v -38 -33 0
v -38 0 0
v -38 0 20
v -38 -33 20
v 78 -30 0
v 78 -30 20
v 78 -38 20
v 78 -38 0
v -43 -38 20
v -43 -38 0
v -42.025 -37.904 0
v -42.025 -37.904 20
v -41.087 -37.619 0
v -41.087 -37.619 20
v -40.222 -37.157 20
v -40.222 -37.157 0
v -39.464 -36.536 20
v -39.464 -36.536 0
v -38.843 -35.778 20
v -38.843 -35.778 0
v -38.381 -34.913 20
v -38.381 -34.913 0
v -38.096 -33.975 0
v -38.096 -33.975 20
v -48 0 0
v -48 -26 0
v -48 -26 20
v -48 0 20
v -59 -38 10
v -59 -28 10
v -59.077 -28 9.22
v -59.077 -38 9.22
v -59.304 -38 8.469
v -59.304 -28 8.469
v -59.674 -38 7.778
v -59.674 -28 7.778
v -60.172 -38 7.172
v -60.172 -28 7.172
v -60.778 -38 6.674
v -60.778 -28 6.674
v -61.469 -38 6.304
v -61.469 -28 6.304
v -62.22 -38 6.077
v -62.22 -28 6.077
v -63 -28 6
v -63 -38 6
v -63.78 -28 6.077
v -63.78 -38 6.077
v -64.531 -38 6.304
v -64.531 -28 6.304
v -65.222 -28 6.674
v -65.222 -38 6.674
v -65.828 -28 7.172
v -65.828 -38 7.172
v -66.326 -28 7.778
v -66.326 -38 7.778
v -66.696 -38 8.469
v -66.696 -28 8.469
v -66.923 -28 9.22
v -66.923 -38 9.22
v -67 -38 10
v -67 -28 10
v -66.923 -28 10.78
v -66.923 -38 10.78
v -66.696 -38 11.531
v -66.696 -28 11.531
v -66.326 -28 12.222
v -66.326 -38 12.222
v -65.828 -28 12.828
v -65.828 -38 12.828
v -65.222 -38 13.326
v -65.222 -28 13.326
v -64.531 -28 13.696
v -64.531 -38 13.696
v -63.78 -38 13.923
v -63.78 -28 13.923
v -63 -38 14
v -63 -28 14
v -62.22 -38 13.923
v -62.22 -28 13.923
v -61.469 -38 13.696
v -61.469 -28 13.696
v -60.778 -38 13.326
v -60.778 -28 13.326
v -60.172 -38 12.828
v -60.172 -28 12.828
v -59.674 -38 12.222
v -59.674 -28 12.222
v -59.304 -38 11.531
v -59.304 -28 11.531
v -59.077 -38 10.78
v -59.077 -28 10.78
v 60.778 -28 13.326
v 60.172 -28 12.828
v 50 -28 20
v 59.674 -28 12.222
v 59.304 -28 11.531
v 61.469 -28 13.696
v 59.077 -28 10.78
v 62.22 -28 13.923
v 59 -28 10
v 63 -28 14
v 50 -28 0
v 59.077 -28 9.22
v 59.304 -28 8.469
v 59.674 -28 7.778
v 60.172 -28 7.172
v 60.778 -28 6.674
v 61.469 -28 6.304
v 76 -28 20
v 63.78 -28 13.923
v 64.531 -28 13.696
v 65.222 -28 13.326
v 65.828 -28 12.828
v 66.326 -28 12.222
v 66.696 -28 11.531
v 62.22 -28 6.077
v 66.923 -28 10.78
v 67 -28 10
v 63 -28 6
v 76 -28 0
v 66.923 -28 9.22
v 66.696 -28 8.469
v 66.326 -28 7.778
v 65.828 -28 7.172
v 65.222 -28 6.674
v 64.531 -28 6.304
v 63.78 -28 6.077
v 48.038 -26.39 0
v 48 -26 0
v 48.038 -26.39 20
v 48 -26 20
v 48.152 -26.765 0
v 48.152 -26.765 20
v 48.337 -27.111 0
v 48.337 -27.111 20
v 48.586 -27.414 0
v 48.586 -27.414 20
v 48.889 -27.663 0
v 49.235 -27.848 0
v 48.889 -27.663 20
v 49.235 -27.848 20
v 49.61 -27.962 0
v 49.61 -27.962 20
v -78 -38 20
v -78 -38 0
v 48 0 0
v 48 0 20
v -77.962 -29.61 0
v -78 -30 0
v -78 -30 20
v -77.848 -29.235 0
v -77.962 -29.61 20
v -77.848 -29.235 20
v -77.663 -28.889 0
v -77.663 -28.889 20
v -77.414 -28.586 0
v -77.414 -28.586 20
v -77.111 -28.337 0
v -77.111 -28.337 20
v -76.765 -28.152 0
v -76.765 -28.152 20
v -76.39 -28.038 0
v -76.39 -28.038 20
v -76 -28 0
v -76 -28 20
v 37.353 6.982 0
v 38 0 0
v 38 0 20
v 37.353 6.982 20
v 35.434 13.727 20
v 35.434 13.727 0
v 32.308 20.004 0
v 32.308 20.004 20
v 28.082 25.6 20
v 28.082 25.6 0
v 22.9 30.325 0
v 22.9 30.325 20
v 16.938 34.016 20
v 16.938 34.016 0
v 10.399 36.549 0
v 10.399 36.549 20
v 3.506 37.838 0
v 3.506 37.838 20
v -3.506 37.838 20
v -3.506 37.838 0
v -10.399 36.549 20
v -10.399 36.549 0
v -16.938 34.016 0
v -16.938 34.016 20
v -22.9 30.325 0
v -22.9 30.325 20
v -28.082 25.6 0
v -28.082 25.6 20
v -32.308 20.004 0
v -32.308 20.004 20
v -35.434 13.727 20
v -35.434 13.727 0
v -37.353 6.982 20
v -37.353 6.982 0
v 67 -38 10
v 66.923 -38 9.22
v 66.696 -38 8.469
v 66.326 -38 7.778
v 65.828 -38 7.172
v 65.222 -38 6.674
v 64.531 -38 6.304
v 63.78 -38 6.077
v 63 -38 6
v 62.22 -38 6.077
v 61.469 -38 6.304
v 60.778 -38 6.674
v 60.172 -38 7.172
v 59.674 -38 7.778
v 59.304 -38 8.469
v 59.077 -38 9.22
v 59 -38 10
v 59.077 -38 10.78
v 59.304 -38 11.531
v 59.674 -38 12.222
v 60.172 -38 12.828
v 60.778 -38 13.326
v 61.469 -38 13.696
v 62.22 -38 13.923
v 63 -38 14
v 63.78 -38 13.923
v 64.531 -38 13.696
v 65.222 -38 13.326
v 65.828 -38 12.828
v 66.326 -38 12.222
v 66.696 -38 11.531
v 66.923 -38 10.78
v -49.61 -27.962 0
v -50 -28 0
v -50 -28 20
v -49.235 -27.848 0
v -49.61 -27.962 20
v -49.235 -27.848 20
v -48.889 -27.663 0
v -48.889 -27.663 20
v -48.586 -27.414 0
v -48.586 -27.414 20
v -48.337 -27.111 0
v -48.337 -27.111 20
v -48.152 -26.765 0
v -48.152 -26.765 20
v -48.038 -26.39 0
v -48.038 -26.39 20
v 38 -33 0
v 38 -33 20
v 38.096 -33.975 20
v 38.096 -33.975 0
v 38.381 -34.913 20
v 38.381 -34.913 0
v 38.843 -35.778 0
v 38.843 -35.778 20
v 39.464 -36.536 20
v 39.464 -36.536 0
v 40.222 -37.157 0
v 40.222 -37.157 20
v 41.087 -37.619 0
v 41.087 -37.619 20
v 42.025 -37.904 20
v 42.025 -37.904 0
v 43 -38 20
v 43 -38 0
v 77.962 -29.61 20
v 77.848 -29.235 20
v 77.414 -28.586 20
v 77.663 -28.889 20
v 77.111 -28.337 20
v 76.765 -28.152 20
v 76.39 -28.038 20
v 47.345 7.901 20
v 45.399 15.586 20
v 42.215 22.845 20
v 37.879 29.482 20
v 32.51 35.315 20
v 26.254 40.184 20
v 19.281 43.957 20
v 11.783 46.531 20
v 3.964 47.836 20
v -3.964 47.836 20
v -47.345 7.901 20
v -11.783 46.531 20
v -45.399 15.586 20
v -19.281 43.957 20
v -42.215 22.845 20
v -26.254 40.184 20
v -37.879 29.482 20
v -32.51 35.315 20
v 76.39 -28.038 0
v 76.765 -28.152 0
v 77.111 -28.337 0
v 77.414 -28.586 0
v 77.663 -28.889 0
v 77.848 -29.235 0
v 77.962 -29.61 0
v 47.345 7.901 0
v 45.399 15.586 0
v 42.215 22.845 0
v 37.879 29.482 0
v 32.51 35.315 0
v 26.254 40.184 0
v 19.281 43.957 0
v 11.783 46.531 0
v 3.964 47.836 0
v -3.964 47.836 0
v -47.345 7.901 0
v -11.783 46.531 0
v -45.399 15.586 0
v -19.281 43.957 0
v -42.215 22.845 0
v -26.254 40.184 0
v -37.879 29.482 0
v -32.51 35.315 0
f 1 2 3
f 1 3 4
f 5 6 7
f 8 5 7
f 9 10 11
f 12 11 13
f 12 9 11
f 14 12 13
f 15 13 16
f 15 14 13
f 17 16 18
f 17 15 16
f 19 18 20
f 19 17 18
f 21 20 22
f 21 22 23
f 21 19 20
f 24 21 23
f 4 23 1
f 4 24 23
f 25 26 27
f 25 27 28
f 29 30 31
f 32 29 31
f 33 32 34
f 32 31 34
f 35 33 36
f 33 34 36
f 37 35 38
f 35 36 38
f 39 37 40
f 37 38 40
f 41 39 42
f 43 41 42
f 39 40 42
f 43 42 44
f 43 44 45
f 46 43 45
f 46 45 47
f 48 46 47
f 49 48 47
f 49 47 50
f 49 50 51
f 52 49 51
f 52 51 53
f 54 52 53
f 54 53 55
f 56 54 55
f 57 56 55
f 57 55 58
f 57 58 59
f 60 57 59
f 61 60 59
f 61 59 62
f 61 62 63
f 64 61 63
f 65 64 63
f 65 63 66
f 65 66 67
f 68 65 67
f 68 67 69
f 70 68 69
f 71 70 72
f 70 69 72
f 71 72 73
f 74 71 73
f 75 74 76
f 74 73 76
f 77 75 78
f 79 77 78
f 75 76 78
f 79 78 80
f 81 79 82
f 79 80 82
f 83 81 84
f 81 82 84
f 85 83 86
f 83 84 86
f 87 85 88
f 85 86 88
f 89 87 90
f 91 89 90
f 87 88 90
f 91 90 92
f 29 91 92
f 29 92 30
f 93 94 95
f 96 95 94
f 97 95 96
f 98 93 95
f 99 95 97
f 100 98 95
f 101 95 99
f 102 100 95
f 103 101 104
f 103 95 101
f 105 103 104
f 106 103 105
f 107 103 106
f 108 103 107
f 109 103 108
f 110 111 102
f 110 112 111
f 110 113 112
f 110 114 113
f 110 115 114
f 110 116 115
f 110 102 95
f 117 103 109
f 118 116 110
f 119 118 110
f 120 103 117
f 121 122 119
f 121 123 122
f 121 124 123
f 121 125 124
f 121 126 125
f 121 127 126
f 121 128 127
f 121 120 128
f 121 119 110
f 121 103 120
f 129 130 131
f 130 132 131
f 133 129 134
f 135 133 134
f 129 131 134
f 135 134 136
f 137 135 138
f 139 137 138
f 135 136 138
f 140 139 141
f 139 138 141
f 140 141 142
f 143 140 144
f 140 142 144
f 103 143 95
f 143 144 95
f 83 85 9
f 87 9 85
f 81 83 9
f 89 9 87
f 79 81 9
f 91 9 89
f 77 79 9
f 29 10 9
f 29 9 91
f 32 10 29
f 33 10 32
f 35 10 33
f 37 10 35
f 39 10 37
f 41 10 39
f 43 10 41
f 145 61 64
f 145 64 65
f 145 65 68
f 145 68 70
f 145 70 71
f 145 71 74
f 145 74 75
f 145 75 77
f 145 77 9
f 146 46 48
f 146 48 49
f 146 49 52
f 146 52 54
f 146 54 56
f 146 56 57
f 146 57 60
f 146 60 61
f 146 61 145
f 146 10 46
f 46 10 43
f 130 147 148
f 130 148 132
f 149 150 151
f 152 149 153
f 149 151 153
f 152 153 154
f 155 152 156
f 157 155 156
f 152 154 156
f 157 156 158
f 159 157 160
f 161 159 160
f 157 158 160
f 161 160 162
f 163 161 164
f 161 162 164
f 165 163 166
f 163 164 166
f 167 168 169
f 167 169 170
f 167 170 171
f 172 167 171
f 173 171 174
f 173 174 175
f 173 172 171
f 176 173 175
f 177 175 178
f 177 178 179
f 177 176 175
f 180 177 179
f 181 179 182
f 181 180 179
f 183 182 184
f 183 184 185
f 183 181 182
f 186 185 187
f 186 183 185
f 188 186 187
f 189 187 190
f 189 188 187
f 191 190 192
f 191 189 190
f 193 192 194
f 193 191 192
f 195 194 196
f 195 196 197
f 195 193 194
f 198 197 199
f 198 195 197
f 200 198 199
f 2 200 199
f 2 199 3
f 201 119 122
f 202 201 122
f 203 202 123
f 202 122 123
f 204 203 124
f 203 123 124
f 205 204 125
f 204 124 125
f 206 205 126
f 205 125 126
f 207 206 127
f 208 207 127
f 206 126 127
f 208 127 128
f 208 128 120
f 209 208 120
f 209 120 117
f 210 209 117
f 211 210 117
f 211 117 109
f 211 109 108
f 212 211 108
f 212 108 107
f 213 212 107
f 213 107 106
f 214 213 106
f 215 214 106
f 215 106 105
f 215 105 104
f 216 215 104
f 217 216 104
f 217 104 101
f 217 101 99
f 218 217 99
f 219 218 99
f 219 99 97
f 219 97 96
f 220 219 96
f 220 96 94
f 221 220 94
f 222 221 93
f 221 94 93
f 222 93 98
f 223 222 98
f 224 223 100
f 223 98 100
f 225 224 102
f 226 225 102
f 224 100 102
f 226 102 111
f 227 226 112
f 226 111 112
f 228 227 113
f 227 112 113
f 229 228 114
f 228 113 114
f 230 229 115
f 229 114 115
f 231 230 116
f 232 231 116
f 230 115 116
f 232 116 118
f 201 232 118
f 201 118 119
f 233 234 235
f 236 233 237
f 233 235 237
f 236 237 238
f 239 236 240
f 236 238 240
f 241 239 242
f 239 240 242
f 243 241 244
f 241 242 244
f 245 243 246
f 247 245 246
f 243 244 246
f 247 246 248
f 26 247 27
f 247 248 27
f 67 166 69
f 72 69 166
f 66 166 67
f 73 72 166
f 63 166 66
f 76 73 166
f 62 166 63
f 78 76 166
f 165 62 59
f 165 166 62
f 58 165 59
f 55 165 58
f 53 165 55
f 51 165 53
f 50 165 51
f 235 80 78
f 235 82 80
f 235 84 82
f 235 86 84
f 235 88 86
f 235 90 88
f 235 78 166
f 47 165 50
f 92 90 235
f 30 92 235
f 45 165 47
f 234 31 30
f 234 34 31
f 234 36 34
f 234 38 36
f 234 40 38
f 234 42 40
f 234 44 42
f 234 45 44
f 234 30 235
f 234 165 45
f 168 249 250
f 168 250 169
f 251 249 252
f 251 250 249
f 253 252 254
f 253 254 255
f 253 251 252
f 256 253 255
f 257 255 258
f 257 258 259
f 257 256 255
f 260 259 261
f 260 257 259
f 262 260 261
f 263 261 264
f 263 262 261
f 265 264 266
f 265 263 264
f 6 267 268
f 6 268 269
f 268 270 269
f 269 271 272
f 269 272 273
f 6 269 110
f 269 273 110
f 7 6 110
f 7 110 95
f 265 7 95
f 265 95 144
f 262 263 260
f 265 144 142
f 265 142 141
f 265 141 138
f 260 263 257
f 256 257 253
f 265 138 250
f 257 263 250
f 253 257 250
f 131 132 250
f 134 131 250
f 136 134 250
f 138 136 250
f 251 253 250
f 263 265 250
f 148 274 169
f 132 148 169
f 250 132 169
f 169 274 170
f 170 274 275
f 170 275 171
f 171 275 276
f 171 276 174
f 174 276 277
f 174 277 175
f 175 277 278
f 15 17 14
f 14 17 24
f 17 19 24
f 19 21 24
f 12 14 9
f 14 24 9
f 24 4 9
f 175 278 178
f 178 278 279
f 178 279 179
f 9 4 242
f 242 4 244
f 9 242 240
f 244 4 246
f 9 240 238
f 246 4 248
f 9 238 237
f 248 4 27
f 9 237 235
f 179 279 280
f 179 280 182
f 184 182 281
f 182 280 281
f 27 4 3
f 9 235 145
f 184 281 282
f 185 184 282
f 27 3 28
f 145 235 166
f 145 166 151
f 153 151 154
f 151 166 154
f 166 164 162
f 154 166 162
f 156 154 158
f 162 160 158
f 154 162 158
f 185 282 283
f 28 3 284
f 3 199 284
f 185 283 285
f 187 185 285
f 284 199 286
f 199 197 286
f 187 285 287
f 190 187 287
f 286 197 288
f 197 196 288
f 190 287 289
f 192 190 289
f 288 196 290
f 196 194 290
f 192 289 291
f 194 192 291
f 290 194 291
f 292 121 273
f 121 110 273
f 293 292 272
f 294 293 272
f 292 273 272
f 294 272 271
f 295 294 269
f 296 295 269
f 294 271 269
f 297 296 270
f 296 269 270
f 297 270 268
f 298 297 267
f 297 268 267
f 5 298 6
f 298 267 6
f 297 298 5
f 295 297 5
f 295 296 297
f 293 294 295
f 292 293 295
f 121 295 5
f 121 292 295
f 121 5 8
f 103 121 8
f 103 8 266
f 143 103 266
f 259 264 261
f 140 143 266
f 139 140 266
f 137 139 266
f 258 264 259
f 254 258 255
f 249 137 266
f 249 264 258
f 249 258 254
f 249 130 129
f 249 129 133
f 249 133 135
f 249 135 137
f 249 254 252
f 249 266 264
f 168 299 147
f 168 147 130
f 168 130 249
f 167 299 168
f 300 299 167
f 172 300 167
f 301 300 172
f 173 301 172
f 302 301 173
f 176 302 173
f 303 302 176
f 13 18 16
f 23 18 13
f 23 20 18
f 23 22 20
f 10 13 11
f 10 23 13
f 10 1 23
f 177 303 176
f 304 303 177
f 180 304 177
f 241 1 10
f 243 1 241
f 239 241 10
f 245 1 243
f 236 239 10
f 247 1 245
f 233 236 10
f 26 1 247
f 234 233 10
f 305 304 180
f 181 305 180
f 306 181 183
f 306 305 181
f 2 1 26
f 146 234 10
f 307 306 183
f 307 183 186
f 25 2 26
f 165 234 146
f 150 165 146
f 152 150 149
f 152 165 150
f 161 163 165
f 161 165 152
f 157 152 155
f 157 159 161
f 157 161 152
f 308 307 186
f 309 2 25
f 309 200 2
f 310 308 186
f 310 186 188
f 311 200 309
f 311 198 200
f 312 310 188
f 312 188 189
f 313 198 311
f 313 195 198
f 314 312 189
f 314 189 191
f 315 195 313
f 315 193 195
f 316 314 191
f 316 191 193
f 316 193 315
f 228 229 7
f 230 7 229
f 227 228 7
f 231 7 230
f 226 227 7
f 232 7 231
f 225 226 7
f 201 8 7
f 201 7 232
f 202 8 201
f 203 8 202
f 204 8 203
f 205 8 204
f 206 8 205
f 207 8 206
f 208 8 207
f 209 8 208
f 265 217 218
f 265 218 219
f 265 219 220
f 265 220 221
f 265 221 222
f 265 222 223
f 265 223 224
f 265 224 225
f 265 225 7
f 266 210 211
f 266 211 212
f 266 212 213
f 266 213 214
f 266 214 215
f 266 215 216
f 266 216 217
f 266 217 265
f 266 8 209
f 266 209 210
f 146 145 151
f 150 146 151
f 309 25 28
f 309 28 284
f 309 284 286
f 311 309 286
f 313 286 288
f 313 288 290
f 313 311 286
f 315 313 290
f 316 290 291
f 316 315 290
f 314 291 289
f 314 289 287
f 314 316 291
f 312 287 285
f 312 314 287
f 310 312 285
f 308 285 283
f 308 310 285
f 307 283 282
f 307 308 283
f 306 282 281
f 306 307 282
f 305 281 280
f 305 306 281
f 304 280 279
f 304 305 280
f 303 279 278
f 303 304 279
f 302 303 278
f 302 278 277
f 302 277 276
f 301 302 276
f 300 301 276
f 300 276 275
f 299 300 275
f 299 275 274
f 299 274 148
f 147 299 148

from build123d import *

# Parameters (mm, degrees)
BOSS_EXTRUDE1_DEPTH = 20
SKETCH3_R           = 4
CUT_EXTRUDE2_DEPTH  = 20
FILLET3_R           = 2
FILLET4_R           = 5


with BuildPart() as part:
    # Sketch1 → Boss-Extrude1 (new body)
    with BuildSketch(Plane.XY):
        with BuildLine():
            Line((-38, -38), (-78, -38))
            Line((-78, -38), (-78, -28))
            Line((-78, -28), (-48, -28))
            Line((-48, -28), (-48, 0))
            ThreePointArc((-48, 0), (0, 48), (48, 0))
            Line((48, 0), (48, -28))
            Line((48, -28), (78, -28))
            Line((78, -28), (78, -38))
            Line((78, -38), (38, -38))
            Line((38, -38), (38, 0))
            ThreePointArc((38, 0), (0, 38), (-38, 0))
            Line((-38, 0), (-38, -38))
        make_face()
    extrude(amount=BOSS_EXTRUDE1_DEPTH)

    # Sketch3 → Cut-Extrude2 (cut)
    with BuildSketch(Plane(origin=(0, -28, 0), x_dir=(1, 0, 0), z_dir=(0, 1, 0))):
        with Locations((-63, -10)):
            Circle(SKETCH3_R)
        with Locations((63, -10)):
            Circle(SKETCH3_R)
    extrude(amount=-CUT_EXTRUDE2_DEPTH, mode=Mode.SUBTRACT)

    # Fillet3
    fillet3_edges = [part.edges().sort_by_distance(p)[0] for p in [
        (48, -28, 10),
        (78, -28, 10),
        (-78, -28, 10),
        (-48, -28, 10),
    ]]
    fillet(fillet3_edges, radius=FILLET3_R)

    # Fillet4
    fillet4_edges = [part.edges().sort_by_distance(p)[0] for p in [
        (38, -38, 10),
        (-38, -38, 10),
    ]]
    fillet(fillet4_edges, radius=FILLET4_R)


solid = part.part
